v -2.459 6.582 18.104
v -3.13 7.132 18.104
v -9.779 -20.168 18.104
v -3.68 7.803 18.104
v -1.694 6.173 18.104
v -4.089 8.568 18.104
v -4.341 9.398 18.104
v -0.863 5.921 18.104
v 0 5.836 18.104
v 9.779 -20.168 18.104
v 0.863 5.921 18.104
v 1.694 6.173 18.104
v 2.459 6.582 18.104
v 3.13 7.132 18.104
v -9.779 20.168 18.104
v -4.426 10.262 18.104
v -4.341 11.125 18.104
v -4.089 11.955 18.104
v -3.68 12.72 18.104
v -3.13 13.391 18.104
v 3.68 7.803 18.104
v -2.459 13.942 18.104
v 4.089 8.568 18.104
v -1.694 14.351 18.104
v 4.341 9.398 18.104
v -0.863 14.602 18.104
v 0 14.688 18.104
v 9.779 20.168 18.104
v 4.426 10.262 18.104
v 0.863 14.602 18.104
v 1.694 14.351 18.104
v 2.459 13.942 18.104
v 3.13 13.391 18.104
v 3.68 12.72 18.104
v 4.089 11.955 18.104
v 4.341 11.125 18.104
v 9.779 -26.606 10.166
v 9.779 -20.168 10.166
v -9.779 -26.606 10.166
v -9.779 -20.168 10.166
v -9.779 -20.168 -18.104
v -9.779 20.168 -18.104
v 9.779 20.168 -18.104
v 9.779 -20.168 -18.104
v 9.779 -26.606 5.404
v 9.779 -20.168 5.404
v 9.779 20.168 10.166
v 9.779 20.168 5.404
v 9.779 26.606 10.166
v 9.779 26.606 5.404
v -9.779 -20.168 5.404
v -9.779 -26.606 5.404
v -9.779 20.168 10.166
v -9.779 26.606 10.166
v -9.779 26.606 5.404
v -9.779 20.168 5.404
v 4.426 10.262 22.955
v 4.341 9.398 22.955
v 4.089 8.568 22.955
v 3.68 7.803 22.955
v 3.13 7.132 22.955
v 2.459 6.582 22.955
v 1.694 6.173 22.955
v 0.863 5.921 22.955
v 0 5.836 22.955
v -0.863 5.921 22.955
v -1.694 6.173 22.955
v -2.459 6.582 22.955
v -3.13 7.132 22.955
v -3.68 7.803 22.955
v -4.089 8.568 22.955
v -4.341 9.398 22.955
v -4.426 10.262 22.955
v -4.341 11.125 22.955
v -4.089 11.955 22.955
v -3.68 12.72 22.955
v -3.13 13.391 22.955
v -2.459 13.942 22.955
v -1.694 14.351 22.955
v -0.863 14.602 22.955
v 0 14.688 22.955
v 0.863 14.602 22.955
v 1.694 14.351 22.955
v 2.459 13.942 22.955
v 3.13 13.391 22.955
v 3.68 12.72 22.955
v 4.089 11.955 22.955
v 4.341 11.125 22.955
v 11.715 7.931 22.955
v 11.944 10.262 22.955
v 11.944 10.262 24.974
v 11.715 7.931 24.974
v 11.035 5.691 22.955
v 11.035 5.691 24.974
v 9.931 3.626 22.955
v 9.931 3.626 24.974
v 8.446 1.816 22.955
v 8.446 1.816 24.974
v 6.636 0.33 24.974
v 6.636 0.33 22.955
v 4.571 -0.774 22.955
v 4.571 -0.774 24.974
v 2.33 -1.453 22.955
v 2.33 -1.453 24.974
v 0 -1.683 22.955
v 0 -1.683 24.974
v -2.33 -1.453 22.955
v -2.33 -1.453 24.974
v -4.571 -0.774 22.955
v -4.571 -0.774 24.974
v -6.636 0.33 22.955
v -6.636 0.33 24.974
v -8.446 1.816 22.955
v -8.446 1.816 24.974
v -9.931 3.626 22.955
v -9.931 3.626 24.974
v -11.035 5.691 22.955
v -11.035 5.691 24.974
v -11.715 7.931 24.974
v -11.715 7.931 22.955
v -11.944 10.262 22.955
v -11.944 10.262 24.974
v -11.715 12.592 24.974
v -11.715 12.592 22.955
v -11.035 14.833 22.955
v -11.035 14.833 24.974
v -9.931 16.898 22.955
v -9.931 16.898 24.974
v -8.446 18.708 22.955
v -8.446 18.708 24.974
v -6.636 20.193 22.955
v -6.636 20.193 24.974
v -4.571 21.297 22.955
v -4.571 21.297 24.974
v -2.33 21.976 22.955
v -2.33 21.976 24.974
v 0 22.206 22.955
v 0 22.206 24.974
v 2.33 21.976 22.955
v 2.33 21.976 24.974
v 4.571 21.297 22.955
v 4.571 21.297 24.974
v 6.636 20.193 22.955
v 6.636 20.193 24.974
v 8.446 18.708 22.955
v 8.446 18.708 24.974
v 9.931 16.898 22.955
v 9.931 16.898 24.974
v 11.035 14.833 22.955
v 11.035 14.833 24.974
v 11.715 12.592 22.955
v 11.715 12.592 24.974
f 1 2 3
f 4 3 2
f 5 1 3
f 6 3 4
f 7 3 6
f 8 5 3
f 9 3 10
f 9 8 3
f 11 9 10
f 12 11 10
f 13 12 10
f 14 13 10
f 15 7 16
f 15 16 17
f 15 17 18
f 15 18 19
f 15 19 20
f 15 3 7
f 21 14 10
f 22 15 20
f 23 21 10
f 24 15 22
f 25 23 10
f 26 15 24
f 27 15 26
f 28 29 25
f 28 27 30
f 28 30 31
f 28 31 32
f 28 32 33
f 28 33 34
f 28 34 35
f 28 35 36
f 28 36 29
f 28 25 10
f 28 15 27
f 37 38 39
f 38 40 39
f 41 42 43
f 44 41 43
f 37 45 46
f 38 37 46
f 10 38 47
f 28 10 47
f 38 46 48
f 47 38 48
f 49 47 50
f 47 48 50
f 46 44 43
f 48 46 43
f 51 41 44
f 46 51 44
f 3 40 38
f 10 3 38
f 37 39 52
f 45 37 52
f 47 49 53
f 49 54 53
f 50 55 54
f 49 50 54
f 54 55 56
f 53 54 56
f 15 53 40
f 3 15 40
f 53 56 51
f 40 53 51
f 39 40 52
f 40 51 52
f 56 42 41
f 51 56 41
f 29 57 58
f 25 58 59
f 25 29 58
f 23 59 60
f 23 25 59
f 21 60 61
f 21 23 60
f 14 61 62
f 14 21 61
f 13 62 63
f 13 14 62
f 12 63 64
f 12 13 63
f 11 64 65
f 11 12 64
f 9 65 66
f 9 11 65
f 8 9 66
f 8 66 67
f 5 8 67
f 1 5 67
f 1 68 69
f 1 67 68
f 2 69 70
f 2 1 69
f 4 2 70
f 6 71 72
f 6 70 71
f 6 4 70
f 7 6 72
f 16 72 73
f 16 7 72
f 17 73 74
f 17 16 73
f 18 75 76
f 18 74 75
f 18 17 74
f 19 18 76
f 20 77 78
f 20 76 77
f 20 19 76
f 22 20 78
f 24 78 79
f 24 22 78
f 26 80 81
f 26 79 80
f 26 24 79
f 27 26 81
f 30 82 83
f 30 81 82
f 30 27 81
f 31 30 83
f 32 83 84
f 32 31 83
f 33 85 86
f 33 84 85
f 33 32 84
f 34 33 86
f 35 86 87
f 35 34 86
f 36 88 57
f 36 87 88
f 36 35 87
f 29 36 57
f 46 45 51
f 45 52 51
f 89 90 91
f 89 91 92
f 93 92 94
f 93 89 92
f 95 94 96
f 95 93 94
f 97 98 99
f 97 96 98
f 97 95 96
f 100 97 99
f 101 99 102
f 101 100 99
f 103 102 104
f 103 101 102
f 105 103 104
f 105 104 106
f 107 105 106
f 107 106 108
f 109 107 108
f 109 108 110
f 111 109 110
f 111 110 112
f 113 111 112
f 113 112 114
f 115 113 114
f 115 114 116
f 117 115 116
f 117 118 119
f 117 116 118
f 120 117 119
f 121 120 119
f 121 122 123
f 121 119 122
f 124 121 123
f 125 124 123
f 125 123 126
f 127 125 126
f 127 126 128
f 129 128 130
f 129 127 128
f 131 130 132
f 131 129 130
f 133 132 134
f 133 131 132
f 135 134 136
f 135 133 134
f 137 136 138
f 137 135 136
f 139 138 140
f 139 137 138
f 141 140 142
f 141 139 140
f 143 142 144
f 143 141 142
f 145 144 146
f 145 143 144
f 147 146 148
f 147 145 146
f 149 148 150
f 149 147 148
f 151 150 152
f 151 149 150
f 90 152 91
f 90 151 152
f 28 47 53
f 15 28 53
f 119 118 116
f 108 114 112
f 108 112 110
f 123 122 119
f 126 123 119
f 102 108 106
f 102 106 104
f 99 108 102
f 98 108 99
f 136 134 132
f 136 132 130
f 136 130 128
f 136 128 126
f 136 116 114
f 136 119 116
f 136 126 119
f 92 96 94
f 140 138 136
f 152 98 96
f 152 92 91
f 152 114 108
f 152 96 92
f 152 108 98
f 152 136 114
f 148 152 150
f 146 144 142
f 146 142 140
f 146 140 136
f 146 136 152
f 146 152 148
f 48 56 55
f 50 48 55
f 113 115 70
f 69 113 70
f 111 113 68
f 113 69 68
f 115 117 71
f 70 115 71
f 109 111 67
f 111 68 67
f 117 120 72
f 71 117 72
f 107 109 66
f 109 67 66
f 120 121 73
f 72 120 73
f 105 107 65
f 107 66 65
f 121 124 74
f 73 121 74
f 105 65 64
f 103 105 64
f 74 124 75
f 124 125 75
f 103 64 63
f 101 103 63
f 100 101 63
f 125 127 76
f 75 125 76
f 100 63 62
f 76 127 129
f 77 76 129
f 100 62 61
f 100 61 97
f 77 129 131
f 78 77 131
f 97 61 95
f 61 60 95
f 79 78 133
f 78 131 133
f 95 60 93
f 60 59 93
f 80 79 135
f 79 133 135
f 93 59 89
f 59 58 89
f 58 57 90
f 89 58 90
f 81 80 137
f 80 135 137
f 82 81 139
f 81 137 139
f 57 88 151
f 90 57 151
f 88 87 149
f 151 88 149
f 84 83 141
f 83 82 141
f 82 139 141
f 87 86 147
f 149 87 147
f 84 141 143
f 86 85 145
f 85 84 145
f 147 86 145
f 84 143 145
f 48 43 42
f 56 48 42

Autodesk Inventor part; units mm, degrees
ref_plane "YZ Plane" through (0, 0, 0) normal (1, 0, 0) x (0, 1, 0)
ref_plane "XZ Plane" through (0, 0, 0) normal (0, 1, 0) x (-1, 0, 0)
ref_plane "XY Plane" through (0, 0, 0) normal (0, 0, 1) x (1, 0, 0)
sketch "Sketch1" plane through (0, 0, 0) normal (0, 0, 1) x (1, 0, 0)
  line L0 (-9.779, -20.1676) -> (9.779, -20.1676)
  line L1 (9.779, -20.1676) -> (9.779, 20.1676)
  line L2 (9.779, 20.1676) -> (-9.779, 20.1676)
  line L3 (-9.779, 20.1676) -> (-9.779, -20.1676)
  line L4 (-9.779, -20.1676) -> (9.779, 20.1676) construction
  line L5 (9.779, -20.1676) -> (-9.779, 20.1676) construction
  point P0 (0, 0)
  dimension "ServoWidth" = 19.558
  dimension "ServoHeight" = 40.3352
extrude "Body" add sketch "Sketch1" along normal mid plane 36.2077
sketch "Sketch2" plane through (0, 0, 18.1038) normal (0, 0, 1) x (1, 0, 0)
  circle A0 centre (0, 10.2616) radius 4.4259
  line L0 (9.779, 20.1676) -> (-9.779, 20.1676) projected
  point P0 (0, 0)
  dimension "d4" = 8.8519
  dimension "d7" = 9.906
extrude "Actuator" add sketch "Sketch2" along normal blind 4.8514
sketch "Sketch3" plane through (0, 10.2616, 22.9552) normal (0, 0, 1) x (1, 0, 0)
  circle A0 centre (0, 0) radius 11.9444
  point P0 (0, -10.2616)
  dimension "ServoWheelDiameter" = 23.8887
extrude "Wheel" add sketch "Sketch3" along normal blind 2.0193
sketch "Sketch4" plane through (-9.779, -20.1676, 18.1038) normal (-1, 0, 0) x (0, 0, 1)
  line L0 (-7.9375, -6.4389) -> (-12.7, -6.4389)
  line L1 (-12.7, -6.4389) -> (-12.7, 0)
  line L2 (-12.7, 0) -> (-7.9375, 0)
  line L3 (-7.9375, 0) -> (-7.9375, -6.4389)
  line L4 (-7.9375, -6.4389) -> (-12.7, 0) construction
  line L5 (-12.7, -6.4389) -> (-7.9375, 0) construction
  line L6 (-36.2077, 0) -> (0, 0) projected
  line L7 (0, 40.3352) -> (0, 0) projected
  line L8 (-12.7, 46.7741) -> (-7.9375, 46.7741)
  line L9 (-7.9375, 46.7741) -> (-7.9375, 40.3352)
  line L10 (-7.9375, 40.3352) -> (-12.7, 40.3352)
  line L11 (-12.7, 40.3352) -> (-12.7, 46.7741)
  line L12 (-12.7, 46.7741) -> (-7.9375, 40.3352) construction
  line L13 (-7.9375, 46.7741) -> (-12.7, 40.3352) construction
  line L14 (-36.2077, 40.3352) -> (0, 40.3352) projected
  point P0 (-18.1038, 20.1676)
  point P1 (-10.3188, -3.2195)
  point P2 (-10.3188, 43.5546)
  point P3 (-7.9375, 43.5546)
  point P4 (-7.9375, -3.2194)
  dimension "ServoTabWidth" = 4.7625
  dimension "ServoTabHeight" = 6.4389
  dimension "ServoTabDepthOffset" = 7.9375
  dimension "d16" = 6.4389
  dimension "d17" = 4.7625
extrude "Tabs" add sketch "Sketch4" against normal up to surface (19.558 mm away)
equation "\"d16\" = ServoTabHeight"
equation "\"d17\" = ServoTabWidth"
properties part number "Servo"
